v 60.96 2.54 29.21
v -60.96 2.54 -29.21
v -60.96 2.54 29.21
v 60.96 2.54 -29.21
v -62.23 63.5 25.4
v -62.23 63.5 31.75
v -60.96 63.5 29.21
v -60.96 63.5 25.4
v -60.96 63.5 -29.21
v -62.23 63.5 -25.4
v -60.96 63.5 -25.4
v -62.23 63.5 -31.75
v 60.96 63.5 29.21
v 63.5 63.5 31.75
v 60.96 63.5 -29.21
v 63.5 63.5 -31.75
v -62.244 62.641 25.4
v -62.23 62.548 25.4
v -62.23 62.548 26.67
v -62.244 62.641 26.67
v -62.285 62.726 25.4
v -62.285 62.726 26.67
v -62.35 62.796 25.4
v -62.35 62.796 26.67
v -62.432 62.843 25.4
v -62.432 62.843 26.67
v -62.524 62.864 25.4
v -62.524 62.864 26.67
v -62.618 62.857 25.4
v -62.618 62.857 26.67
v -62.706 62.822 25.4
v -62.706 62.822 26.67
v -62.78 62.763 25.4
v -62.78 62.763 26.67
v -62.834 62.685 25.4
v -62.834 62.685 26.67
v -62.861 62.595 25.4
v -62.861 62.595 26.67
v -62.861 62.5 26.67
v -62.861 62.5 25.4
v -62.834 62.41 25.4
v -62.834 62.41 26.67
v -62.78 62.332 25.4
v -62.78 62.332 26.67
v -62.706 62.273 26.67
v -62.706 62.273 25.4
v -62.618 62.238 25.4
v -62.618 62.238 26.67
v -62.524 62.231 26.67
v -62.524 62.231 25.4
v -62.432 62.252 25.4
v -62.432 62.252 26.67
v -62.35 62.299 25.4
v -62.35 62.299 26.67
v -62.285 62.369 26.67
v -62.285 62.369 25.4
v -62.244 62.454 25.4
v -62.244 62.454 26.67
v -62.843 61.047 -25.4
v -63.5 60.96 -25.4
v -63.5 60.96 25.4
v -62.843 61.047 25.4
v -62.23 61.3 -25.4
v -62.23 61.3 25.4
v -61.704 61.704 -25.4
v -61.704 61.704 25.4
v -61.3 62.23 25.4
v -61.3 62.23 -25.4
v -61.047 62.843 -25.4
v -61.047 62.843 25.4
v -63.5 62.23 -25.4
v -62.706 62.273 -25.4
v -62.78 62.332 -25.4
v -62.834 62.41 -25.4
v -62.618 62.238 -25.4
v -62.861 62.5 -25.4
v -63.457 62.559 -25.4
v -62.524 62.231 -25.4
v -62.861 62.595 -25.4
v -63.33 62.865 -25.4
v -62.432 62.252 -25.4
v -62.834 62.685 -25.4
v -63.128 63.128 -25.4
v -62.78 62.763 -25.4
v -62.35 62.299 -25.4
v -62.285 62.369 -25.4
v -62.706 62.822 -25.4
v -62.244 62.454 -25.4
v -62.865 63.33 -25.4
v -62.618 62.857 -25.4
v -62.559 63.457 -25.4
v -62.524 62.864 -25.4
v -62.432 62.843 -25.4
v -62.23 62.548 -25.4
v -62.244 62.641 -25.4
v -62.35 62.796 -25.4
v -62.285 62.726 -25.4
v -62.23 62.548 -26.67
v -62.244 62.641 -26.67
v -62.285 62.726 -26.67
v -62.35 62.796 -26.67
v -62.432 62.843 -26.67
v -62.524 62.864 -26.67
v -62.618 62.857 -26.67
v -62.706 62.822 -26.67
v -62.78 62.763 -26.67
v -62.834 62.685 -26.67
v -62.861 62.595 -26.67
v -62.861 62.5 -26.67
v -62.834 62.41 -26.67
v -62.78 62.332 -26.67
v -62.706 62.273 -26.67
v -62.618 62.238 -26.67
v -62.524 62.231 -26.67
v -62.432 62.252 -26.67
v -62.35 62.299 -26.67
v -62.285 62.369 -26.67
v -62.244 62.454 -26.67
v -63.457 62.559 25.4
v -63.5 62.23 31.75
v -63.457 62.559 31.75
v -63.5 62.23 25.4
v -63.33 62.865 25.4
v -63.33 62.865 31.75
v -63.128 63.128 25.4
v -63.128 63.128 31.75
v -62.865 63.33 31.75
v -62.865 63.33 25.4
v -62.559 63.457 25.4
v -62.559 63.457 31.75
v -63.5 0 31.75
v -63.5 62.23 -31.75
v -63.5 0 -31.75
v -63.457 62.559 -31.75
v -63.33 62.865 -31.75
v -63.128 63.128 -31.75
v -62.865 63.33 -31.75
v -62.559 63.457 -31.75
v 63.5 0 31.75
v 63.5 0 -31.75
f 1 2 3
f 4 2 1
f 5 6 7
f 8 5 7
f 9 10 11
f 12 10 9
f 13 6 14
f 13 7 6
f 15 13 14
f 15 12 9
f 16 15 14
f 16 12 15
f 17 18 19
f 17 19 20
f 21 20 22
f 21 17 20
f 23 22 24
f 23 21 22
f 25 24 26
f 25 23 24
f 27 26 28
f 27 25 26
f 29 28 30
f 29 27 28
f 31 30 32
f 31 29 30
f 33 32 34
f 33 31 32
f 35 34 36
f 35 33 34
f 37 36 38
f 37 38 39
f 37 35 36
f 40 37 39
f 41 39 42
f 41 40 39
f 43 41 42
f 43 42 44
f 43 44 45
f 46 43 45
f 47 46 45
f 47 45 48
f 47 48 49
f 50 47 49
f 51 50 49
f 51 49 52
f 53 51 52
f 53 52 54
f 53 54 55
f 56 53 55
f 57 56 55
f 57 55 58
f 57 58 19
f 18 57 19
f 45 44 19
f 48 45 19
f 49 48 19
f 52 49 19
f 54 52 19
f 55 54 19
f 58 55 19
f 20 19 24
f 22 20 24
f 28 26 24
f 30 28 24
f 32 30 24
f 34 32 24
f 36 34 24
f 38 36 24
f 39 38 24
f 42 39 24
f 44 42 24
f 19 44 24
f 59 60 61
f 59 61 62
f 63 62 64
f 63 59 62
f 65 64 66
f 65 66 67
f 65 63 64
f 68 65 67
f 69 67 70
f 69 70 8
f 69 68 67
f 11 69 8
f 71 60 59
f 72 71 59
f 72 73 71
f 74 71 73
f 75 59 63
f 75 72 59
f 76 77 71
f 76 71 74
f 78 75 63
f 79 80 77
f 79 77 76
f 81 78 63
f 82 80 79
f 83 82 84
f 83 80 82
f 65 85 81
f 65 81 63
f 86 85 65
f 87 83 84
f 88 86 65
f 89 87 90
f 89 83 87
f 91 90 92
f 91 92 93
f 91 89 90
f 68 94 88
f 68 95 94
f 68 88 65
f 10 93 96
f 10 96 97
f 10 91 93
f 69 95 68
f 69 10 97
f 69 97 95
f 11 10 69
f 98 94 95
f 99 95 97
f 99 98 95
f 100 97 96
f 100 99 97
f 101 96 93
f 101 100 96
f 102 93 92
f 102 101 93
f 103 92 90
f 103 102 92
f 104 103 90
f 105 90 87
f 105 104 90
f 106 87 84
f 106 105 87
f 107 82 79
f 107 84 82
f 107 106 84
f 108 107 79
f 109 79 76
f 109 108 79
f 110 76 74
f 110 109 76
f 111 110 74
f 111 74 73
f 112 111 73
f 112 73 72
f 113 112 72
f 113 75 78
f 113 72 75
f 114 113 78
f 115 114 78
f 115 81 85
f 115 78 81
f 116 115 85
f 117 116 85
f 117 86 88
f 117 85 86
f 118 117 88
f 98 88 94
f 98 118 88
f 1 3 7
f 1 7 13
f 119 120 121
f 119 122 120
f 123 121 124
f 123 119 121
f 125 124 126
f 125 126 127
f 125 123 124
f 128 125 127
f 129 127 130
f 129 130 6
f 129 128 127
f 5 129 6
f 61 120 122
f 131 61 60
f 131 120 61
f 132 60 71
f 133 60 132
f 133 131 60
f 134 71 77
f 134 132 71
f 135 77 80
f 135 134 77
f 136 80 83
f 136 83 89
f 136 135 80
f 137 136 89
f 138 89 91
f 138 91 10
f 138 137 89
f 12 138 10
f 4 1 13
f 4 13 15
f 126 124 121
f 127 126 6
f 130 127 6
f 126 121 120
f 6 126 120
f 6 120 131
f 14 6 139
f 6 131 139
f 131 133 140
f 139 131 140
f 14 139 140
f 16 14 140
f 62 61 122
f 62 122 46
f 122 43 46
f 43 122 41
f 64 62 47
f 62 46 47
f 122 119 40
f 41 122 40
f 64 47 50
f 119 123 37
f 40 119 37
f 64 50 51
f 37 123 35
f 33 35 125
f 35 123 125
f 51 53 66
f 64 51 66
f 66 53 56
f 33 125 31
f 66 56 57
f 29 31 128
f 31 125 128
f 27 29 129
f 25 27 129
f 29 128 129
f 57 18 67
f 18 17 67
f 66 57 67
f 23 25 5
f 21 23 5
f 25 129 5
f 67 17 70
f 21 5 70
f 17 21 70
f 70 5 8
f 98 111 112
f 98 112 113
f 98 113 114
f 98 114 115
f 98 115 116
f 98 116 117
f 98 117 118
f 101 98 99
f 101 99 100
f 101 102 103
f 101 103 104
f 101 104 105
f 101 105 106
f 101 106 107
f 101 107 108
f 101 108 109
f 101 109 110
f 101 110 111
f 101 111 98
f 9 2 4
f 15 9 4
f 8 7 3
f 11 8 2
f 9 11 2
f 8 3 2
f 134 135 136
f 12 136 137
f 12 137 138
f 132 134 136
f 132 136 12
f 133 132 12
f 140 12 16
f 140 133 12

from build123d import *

# Parameters (mm, degrees)
SKETCH2_W               = 127
SKETCH2_H               = 63.5
BOSS_EXTRUDE1_DEPTH     = 63.5
SHELL1_T                = -2.54
CUT_EXTRUDE1_DEPTH      = 25.4
CUT_EXTRUDE1_DEPTH_BACK = 25.4
CUT_EXTRUDE2_DEPTH      = 52.07
CUT_EXTRUDE2_DEPTH_BACK = 1.27
SKETCH5_R               = 0.3175
FILLET1_R               = 1.27


with BuildPart() as part:
    # Sketch2 → Boss-Extrude1 (new body)
    with BuildSketch(Plane(origin=(0, 0, 0), x_dir=(1, 0, 0), z_dir=(0, 1, 0))):
        Rectangle(SKETCH2_W, SKETCH2_H)
    extrude(amount=BOSS_EXTRUDE1_DEPTH)

    # Shell1
    shell1_openings = [part.faces().sort_by_distance(p)[0] for p in [
        (0, 63.5, 0),
    ]]
    offset(amount=SHELL1_T, openings=shell1_openings, kind=Kind.INTERSECTION)

    # Sketch4 → Cut-Extrude1 (cut, two sides: drawn at the far end of the back side and taken through both)
    with BuildSketch(Plane.XY.offset(-CUT_EXTRUDE1_DEPTH_BACK)):
        with BuildLine():
            Line((-60.96, 63.5), (-63.5, 63.5))
            Line((-63.5, 63.5), (-63.5, 60.96))
            ThreePointArc((-63.5, 60.96), (-61.703948776, 61.703948776), (-60.96, 63.5))
        make_face()
    extrude(amount=CUT_EXTRUDE1_DEPTH + CUT_EXTRUDE1_DEPTH_BACK, mode=Mode.SUBTRACT)

    # Sketch5 → Cut-Extrude2 (cut, two sides: drawn at the far end of the back side and taken through both)
    with BuildSketch(Plane.XY.offset(-25.4).offset(-CUT_EXTRUDE2_DEPTH_BACK)):
        with Locations((-62.5475, 62.5475)):
            Circle(SKETCH5_R)
    extrude(amount=CUT_EXTRUDE2_DEPTH + CUT_EXTRUDE2_DEPTH_BACK, mode=Mode.SUBTRACT)

    # Fillet1
    fillet1_edges = [part.edges().sort_by_distance(p)[0] for p in [
        (-63.5, 63.5, -28.575),
        (-63.5, 63.5, 28.575),
    ]]
    fillet(fillet1_edges, radius=FILLET1_R)


solid = part.part
